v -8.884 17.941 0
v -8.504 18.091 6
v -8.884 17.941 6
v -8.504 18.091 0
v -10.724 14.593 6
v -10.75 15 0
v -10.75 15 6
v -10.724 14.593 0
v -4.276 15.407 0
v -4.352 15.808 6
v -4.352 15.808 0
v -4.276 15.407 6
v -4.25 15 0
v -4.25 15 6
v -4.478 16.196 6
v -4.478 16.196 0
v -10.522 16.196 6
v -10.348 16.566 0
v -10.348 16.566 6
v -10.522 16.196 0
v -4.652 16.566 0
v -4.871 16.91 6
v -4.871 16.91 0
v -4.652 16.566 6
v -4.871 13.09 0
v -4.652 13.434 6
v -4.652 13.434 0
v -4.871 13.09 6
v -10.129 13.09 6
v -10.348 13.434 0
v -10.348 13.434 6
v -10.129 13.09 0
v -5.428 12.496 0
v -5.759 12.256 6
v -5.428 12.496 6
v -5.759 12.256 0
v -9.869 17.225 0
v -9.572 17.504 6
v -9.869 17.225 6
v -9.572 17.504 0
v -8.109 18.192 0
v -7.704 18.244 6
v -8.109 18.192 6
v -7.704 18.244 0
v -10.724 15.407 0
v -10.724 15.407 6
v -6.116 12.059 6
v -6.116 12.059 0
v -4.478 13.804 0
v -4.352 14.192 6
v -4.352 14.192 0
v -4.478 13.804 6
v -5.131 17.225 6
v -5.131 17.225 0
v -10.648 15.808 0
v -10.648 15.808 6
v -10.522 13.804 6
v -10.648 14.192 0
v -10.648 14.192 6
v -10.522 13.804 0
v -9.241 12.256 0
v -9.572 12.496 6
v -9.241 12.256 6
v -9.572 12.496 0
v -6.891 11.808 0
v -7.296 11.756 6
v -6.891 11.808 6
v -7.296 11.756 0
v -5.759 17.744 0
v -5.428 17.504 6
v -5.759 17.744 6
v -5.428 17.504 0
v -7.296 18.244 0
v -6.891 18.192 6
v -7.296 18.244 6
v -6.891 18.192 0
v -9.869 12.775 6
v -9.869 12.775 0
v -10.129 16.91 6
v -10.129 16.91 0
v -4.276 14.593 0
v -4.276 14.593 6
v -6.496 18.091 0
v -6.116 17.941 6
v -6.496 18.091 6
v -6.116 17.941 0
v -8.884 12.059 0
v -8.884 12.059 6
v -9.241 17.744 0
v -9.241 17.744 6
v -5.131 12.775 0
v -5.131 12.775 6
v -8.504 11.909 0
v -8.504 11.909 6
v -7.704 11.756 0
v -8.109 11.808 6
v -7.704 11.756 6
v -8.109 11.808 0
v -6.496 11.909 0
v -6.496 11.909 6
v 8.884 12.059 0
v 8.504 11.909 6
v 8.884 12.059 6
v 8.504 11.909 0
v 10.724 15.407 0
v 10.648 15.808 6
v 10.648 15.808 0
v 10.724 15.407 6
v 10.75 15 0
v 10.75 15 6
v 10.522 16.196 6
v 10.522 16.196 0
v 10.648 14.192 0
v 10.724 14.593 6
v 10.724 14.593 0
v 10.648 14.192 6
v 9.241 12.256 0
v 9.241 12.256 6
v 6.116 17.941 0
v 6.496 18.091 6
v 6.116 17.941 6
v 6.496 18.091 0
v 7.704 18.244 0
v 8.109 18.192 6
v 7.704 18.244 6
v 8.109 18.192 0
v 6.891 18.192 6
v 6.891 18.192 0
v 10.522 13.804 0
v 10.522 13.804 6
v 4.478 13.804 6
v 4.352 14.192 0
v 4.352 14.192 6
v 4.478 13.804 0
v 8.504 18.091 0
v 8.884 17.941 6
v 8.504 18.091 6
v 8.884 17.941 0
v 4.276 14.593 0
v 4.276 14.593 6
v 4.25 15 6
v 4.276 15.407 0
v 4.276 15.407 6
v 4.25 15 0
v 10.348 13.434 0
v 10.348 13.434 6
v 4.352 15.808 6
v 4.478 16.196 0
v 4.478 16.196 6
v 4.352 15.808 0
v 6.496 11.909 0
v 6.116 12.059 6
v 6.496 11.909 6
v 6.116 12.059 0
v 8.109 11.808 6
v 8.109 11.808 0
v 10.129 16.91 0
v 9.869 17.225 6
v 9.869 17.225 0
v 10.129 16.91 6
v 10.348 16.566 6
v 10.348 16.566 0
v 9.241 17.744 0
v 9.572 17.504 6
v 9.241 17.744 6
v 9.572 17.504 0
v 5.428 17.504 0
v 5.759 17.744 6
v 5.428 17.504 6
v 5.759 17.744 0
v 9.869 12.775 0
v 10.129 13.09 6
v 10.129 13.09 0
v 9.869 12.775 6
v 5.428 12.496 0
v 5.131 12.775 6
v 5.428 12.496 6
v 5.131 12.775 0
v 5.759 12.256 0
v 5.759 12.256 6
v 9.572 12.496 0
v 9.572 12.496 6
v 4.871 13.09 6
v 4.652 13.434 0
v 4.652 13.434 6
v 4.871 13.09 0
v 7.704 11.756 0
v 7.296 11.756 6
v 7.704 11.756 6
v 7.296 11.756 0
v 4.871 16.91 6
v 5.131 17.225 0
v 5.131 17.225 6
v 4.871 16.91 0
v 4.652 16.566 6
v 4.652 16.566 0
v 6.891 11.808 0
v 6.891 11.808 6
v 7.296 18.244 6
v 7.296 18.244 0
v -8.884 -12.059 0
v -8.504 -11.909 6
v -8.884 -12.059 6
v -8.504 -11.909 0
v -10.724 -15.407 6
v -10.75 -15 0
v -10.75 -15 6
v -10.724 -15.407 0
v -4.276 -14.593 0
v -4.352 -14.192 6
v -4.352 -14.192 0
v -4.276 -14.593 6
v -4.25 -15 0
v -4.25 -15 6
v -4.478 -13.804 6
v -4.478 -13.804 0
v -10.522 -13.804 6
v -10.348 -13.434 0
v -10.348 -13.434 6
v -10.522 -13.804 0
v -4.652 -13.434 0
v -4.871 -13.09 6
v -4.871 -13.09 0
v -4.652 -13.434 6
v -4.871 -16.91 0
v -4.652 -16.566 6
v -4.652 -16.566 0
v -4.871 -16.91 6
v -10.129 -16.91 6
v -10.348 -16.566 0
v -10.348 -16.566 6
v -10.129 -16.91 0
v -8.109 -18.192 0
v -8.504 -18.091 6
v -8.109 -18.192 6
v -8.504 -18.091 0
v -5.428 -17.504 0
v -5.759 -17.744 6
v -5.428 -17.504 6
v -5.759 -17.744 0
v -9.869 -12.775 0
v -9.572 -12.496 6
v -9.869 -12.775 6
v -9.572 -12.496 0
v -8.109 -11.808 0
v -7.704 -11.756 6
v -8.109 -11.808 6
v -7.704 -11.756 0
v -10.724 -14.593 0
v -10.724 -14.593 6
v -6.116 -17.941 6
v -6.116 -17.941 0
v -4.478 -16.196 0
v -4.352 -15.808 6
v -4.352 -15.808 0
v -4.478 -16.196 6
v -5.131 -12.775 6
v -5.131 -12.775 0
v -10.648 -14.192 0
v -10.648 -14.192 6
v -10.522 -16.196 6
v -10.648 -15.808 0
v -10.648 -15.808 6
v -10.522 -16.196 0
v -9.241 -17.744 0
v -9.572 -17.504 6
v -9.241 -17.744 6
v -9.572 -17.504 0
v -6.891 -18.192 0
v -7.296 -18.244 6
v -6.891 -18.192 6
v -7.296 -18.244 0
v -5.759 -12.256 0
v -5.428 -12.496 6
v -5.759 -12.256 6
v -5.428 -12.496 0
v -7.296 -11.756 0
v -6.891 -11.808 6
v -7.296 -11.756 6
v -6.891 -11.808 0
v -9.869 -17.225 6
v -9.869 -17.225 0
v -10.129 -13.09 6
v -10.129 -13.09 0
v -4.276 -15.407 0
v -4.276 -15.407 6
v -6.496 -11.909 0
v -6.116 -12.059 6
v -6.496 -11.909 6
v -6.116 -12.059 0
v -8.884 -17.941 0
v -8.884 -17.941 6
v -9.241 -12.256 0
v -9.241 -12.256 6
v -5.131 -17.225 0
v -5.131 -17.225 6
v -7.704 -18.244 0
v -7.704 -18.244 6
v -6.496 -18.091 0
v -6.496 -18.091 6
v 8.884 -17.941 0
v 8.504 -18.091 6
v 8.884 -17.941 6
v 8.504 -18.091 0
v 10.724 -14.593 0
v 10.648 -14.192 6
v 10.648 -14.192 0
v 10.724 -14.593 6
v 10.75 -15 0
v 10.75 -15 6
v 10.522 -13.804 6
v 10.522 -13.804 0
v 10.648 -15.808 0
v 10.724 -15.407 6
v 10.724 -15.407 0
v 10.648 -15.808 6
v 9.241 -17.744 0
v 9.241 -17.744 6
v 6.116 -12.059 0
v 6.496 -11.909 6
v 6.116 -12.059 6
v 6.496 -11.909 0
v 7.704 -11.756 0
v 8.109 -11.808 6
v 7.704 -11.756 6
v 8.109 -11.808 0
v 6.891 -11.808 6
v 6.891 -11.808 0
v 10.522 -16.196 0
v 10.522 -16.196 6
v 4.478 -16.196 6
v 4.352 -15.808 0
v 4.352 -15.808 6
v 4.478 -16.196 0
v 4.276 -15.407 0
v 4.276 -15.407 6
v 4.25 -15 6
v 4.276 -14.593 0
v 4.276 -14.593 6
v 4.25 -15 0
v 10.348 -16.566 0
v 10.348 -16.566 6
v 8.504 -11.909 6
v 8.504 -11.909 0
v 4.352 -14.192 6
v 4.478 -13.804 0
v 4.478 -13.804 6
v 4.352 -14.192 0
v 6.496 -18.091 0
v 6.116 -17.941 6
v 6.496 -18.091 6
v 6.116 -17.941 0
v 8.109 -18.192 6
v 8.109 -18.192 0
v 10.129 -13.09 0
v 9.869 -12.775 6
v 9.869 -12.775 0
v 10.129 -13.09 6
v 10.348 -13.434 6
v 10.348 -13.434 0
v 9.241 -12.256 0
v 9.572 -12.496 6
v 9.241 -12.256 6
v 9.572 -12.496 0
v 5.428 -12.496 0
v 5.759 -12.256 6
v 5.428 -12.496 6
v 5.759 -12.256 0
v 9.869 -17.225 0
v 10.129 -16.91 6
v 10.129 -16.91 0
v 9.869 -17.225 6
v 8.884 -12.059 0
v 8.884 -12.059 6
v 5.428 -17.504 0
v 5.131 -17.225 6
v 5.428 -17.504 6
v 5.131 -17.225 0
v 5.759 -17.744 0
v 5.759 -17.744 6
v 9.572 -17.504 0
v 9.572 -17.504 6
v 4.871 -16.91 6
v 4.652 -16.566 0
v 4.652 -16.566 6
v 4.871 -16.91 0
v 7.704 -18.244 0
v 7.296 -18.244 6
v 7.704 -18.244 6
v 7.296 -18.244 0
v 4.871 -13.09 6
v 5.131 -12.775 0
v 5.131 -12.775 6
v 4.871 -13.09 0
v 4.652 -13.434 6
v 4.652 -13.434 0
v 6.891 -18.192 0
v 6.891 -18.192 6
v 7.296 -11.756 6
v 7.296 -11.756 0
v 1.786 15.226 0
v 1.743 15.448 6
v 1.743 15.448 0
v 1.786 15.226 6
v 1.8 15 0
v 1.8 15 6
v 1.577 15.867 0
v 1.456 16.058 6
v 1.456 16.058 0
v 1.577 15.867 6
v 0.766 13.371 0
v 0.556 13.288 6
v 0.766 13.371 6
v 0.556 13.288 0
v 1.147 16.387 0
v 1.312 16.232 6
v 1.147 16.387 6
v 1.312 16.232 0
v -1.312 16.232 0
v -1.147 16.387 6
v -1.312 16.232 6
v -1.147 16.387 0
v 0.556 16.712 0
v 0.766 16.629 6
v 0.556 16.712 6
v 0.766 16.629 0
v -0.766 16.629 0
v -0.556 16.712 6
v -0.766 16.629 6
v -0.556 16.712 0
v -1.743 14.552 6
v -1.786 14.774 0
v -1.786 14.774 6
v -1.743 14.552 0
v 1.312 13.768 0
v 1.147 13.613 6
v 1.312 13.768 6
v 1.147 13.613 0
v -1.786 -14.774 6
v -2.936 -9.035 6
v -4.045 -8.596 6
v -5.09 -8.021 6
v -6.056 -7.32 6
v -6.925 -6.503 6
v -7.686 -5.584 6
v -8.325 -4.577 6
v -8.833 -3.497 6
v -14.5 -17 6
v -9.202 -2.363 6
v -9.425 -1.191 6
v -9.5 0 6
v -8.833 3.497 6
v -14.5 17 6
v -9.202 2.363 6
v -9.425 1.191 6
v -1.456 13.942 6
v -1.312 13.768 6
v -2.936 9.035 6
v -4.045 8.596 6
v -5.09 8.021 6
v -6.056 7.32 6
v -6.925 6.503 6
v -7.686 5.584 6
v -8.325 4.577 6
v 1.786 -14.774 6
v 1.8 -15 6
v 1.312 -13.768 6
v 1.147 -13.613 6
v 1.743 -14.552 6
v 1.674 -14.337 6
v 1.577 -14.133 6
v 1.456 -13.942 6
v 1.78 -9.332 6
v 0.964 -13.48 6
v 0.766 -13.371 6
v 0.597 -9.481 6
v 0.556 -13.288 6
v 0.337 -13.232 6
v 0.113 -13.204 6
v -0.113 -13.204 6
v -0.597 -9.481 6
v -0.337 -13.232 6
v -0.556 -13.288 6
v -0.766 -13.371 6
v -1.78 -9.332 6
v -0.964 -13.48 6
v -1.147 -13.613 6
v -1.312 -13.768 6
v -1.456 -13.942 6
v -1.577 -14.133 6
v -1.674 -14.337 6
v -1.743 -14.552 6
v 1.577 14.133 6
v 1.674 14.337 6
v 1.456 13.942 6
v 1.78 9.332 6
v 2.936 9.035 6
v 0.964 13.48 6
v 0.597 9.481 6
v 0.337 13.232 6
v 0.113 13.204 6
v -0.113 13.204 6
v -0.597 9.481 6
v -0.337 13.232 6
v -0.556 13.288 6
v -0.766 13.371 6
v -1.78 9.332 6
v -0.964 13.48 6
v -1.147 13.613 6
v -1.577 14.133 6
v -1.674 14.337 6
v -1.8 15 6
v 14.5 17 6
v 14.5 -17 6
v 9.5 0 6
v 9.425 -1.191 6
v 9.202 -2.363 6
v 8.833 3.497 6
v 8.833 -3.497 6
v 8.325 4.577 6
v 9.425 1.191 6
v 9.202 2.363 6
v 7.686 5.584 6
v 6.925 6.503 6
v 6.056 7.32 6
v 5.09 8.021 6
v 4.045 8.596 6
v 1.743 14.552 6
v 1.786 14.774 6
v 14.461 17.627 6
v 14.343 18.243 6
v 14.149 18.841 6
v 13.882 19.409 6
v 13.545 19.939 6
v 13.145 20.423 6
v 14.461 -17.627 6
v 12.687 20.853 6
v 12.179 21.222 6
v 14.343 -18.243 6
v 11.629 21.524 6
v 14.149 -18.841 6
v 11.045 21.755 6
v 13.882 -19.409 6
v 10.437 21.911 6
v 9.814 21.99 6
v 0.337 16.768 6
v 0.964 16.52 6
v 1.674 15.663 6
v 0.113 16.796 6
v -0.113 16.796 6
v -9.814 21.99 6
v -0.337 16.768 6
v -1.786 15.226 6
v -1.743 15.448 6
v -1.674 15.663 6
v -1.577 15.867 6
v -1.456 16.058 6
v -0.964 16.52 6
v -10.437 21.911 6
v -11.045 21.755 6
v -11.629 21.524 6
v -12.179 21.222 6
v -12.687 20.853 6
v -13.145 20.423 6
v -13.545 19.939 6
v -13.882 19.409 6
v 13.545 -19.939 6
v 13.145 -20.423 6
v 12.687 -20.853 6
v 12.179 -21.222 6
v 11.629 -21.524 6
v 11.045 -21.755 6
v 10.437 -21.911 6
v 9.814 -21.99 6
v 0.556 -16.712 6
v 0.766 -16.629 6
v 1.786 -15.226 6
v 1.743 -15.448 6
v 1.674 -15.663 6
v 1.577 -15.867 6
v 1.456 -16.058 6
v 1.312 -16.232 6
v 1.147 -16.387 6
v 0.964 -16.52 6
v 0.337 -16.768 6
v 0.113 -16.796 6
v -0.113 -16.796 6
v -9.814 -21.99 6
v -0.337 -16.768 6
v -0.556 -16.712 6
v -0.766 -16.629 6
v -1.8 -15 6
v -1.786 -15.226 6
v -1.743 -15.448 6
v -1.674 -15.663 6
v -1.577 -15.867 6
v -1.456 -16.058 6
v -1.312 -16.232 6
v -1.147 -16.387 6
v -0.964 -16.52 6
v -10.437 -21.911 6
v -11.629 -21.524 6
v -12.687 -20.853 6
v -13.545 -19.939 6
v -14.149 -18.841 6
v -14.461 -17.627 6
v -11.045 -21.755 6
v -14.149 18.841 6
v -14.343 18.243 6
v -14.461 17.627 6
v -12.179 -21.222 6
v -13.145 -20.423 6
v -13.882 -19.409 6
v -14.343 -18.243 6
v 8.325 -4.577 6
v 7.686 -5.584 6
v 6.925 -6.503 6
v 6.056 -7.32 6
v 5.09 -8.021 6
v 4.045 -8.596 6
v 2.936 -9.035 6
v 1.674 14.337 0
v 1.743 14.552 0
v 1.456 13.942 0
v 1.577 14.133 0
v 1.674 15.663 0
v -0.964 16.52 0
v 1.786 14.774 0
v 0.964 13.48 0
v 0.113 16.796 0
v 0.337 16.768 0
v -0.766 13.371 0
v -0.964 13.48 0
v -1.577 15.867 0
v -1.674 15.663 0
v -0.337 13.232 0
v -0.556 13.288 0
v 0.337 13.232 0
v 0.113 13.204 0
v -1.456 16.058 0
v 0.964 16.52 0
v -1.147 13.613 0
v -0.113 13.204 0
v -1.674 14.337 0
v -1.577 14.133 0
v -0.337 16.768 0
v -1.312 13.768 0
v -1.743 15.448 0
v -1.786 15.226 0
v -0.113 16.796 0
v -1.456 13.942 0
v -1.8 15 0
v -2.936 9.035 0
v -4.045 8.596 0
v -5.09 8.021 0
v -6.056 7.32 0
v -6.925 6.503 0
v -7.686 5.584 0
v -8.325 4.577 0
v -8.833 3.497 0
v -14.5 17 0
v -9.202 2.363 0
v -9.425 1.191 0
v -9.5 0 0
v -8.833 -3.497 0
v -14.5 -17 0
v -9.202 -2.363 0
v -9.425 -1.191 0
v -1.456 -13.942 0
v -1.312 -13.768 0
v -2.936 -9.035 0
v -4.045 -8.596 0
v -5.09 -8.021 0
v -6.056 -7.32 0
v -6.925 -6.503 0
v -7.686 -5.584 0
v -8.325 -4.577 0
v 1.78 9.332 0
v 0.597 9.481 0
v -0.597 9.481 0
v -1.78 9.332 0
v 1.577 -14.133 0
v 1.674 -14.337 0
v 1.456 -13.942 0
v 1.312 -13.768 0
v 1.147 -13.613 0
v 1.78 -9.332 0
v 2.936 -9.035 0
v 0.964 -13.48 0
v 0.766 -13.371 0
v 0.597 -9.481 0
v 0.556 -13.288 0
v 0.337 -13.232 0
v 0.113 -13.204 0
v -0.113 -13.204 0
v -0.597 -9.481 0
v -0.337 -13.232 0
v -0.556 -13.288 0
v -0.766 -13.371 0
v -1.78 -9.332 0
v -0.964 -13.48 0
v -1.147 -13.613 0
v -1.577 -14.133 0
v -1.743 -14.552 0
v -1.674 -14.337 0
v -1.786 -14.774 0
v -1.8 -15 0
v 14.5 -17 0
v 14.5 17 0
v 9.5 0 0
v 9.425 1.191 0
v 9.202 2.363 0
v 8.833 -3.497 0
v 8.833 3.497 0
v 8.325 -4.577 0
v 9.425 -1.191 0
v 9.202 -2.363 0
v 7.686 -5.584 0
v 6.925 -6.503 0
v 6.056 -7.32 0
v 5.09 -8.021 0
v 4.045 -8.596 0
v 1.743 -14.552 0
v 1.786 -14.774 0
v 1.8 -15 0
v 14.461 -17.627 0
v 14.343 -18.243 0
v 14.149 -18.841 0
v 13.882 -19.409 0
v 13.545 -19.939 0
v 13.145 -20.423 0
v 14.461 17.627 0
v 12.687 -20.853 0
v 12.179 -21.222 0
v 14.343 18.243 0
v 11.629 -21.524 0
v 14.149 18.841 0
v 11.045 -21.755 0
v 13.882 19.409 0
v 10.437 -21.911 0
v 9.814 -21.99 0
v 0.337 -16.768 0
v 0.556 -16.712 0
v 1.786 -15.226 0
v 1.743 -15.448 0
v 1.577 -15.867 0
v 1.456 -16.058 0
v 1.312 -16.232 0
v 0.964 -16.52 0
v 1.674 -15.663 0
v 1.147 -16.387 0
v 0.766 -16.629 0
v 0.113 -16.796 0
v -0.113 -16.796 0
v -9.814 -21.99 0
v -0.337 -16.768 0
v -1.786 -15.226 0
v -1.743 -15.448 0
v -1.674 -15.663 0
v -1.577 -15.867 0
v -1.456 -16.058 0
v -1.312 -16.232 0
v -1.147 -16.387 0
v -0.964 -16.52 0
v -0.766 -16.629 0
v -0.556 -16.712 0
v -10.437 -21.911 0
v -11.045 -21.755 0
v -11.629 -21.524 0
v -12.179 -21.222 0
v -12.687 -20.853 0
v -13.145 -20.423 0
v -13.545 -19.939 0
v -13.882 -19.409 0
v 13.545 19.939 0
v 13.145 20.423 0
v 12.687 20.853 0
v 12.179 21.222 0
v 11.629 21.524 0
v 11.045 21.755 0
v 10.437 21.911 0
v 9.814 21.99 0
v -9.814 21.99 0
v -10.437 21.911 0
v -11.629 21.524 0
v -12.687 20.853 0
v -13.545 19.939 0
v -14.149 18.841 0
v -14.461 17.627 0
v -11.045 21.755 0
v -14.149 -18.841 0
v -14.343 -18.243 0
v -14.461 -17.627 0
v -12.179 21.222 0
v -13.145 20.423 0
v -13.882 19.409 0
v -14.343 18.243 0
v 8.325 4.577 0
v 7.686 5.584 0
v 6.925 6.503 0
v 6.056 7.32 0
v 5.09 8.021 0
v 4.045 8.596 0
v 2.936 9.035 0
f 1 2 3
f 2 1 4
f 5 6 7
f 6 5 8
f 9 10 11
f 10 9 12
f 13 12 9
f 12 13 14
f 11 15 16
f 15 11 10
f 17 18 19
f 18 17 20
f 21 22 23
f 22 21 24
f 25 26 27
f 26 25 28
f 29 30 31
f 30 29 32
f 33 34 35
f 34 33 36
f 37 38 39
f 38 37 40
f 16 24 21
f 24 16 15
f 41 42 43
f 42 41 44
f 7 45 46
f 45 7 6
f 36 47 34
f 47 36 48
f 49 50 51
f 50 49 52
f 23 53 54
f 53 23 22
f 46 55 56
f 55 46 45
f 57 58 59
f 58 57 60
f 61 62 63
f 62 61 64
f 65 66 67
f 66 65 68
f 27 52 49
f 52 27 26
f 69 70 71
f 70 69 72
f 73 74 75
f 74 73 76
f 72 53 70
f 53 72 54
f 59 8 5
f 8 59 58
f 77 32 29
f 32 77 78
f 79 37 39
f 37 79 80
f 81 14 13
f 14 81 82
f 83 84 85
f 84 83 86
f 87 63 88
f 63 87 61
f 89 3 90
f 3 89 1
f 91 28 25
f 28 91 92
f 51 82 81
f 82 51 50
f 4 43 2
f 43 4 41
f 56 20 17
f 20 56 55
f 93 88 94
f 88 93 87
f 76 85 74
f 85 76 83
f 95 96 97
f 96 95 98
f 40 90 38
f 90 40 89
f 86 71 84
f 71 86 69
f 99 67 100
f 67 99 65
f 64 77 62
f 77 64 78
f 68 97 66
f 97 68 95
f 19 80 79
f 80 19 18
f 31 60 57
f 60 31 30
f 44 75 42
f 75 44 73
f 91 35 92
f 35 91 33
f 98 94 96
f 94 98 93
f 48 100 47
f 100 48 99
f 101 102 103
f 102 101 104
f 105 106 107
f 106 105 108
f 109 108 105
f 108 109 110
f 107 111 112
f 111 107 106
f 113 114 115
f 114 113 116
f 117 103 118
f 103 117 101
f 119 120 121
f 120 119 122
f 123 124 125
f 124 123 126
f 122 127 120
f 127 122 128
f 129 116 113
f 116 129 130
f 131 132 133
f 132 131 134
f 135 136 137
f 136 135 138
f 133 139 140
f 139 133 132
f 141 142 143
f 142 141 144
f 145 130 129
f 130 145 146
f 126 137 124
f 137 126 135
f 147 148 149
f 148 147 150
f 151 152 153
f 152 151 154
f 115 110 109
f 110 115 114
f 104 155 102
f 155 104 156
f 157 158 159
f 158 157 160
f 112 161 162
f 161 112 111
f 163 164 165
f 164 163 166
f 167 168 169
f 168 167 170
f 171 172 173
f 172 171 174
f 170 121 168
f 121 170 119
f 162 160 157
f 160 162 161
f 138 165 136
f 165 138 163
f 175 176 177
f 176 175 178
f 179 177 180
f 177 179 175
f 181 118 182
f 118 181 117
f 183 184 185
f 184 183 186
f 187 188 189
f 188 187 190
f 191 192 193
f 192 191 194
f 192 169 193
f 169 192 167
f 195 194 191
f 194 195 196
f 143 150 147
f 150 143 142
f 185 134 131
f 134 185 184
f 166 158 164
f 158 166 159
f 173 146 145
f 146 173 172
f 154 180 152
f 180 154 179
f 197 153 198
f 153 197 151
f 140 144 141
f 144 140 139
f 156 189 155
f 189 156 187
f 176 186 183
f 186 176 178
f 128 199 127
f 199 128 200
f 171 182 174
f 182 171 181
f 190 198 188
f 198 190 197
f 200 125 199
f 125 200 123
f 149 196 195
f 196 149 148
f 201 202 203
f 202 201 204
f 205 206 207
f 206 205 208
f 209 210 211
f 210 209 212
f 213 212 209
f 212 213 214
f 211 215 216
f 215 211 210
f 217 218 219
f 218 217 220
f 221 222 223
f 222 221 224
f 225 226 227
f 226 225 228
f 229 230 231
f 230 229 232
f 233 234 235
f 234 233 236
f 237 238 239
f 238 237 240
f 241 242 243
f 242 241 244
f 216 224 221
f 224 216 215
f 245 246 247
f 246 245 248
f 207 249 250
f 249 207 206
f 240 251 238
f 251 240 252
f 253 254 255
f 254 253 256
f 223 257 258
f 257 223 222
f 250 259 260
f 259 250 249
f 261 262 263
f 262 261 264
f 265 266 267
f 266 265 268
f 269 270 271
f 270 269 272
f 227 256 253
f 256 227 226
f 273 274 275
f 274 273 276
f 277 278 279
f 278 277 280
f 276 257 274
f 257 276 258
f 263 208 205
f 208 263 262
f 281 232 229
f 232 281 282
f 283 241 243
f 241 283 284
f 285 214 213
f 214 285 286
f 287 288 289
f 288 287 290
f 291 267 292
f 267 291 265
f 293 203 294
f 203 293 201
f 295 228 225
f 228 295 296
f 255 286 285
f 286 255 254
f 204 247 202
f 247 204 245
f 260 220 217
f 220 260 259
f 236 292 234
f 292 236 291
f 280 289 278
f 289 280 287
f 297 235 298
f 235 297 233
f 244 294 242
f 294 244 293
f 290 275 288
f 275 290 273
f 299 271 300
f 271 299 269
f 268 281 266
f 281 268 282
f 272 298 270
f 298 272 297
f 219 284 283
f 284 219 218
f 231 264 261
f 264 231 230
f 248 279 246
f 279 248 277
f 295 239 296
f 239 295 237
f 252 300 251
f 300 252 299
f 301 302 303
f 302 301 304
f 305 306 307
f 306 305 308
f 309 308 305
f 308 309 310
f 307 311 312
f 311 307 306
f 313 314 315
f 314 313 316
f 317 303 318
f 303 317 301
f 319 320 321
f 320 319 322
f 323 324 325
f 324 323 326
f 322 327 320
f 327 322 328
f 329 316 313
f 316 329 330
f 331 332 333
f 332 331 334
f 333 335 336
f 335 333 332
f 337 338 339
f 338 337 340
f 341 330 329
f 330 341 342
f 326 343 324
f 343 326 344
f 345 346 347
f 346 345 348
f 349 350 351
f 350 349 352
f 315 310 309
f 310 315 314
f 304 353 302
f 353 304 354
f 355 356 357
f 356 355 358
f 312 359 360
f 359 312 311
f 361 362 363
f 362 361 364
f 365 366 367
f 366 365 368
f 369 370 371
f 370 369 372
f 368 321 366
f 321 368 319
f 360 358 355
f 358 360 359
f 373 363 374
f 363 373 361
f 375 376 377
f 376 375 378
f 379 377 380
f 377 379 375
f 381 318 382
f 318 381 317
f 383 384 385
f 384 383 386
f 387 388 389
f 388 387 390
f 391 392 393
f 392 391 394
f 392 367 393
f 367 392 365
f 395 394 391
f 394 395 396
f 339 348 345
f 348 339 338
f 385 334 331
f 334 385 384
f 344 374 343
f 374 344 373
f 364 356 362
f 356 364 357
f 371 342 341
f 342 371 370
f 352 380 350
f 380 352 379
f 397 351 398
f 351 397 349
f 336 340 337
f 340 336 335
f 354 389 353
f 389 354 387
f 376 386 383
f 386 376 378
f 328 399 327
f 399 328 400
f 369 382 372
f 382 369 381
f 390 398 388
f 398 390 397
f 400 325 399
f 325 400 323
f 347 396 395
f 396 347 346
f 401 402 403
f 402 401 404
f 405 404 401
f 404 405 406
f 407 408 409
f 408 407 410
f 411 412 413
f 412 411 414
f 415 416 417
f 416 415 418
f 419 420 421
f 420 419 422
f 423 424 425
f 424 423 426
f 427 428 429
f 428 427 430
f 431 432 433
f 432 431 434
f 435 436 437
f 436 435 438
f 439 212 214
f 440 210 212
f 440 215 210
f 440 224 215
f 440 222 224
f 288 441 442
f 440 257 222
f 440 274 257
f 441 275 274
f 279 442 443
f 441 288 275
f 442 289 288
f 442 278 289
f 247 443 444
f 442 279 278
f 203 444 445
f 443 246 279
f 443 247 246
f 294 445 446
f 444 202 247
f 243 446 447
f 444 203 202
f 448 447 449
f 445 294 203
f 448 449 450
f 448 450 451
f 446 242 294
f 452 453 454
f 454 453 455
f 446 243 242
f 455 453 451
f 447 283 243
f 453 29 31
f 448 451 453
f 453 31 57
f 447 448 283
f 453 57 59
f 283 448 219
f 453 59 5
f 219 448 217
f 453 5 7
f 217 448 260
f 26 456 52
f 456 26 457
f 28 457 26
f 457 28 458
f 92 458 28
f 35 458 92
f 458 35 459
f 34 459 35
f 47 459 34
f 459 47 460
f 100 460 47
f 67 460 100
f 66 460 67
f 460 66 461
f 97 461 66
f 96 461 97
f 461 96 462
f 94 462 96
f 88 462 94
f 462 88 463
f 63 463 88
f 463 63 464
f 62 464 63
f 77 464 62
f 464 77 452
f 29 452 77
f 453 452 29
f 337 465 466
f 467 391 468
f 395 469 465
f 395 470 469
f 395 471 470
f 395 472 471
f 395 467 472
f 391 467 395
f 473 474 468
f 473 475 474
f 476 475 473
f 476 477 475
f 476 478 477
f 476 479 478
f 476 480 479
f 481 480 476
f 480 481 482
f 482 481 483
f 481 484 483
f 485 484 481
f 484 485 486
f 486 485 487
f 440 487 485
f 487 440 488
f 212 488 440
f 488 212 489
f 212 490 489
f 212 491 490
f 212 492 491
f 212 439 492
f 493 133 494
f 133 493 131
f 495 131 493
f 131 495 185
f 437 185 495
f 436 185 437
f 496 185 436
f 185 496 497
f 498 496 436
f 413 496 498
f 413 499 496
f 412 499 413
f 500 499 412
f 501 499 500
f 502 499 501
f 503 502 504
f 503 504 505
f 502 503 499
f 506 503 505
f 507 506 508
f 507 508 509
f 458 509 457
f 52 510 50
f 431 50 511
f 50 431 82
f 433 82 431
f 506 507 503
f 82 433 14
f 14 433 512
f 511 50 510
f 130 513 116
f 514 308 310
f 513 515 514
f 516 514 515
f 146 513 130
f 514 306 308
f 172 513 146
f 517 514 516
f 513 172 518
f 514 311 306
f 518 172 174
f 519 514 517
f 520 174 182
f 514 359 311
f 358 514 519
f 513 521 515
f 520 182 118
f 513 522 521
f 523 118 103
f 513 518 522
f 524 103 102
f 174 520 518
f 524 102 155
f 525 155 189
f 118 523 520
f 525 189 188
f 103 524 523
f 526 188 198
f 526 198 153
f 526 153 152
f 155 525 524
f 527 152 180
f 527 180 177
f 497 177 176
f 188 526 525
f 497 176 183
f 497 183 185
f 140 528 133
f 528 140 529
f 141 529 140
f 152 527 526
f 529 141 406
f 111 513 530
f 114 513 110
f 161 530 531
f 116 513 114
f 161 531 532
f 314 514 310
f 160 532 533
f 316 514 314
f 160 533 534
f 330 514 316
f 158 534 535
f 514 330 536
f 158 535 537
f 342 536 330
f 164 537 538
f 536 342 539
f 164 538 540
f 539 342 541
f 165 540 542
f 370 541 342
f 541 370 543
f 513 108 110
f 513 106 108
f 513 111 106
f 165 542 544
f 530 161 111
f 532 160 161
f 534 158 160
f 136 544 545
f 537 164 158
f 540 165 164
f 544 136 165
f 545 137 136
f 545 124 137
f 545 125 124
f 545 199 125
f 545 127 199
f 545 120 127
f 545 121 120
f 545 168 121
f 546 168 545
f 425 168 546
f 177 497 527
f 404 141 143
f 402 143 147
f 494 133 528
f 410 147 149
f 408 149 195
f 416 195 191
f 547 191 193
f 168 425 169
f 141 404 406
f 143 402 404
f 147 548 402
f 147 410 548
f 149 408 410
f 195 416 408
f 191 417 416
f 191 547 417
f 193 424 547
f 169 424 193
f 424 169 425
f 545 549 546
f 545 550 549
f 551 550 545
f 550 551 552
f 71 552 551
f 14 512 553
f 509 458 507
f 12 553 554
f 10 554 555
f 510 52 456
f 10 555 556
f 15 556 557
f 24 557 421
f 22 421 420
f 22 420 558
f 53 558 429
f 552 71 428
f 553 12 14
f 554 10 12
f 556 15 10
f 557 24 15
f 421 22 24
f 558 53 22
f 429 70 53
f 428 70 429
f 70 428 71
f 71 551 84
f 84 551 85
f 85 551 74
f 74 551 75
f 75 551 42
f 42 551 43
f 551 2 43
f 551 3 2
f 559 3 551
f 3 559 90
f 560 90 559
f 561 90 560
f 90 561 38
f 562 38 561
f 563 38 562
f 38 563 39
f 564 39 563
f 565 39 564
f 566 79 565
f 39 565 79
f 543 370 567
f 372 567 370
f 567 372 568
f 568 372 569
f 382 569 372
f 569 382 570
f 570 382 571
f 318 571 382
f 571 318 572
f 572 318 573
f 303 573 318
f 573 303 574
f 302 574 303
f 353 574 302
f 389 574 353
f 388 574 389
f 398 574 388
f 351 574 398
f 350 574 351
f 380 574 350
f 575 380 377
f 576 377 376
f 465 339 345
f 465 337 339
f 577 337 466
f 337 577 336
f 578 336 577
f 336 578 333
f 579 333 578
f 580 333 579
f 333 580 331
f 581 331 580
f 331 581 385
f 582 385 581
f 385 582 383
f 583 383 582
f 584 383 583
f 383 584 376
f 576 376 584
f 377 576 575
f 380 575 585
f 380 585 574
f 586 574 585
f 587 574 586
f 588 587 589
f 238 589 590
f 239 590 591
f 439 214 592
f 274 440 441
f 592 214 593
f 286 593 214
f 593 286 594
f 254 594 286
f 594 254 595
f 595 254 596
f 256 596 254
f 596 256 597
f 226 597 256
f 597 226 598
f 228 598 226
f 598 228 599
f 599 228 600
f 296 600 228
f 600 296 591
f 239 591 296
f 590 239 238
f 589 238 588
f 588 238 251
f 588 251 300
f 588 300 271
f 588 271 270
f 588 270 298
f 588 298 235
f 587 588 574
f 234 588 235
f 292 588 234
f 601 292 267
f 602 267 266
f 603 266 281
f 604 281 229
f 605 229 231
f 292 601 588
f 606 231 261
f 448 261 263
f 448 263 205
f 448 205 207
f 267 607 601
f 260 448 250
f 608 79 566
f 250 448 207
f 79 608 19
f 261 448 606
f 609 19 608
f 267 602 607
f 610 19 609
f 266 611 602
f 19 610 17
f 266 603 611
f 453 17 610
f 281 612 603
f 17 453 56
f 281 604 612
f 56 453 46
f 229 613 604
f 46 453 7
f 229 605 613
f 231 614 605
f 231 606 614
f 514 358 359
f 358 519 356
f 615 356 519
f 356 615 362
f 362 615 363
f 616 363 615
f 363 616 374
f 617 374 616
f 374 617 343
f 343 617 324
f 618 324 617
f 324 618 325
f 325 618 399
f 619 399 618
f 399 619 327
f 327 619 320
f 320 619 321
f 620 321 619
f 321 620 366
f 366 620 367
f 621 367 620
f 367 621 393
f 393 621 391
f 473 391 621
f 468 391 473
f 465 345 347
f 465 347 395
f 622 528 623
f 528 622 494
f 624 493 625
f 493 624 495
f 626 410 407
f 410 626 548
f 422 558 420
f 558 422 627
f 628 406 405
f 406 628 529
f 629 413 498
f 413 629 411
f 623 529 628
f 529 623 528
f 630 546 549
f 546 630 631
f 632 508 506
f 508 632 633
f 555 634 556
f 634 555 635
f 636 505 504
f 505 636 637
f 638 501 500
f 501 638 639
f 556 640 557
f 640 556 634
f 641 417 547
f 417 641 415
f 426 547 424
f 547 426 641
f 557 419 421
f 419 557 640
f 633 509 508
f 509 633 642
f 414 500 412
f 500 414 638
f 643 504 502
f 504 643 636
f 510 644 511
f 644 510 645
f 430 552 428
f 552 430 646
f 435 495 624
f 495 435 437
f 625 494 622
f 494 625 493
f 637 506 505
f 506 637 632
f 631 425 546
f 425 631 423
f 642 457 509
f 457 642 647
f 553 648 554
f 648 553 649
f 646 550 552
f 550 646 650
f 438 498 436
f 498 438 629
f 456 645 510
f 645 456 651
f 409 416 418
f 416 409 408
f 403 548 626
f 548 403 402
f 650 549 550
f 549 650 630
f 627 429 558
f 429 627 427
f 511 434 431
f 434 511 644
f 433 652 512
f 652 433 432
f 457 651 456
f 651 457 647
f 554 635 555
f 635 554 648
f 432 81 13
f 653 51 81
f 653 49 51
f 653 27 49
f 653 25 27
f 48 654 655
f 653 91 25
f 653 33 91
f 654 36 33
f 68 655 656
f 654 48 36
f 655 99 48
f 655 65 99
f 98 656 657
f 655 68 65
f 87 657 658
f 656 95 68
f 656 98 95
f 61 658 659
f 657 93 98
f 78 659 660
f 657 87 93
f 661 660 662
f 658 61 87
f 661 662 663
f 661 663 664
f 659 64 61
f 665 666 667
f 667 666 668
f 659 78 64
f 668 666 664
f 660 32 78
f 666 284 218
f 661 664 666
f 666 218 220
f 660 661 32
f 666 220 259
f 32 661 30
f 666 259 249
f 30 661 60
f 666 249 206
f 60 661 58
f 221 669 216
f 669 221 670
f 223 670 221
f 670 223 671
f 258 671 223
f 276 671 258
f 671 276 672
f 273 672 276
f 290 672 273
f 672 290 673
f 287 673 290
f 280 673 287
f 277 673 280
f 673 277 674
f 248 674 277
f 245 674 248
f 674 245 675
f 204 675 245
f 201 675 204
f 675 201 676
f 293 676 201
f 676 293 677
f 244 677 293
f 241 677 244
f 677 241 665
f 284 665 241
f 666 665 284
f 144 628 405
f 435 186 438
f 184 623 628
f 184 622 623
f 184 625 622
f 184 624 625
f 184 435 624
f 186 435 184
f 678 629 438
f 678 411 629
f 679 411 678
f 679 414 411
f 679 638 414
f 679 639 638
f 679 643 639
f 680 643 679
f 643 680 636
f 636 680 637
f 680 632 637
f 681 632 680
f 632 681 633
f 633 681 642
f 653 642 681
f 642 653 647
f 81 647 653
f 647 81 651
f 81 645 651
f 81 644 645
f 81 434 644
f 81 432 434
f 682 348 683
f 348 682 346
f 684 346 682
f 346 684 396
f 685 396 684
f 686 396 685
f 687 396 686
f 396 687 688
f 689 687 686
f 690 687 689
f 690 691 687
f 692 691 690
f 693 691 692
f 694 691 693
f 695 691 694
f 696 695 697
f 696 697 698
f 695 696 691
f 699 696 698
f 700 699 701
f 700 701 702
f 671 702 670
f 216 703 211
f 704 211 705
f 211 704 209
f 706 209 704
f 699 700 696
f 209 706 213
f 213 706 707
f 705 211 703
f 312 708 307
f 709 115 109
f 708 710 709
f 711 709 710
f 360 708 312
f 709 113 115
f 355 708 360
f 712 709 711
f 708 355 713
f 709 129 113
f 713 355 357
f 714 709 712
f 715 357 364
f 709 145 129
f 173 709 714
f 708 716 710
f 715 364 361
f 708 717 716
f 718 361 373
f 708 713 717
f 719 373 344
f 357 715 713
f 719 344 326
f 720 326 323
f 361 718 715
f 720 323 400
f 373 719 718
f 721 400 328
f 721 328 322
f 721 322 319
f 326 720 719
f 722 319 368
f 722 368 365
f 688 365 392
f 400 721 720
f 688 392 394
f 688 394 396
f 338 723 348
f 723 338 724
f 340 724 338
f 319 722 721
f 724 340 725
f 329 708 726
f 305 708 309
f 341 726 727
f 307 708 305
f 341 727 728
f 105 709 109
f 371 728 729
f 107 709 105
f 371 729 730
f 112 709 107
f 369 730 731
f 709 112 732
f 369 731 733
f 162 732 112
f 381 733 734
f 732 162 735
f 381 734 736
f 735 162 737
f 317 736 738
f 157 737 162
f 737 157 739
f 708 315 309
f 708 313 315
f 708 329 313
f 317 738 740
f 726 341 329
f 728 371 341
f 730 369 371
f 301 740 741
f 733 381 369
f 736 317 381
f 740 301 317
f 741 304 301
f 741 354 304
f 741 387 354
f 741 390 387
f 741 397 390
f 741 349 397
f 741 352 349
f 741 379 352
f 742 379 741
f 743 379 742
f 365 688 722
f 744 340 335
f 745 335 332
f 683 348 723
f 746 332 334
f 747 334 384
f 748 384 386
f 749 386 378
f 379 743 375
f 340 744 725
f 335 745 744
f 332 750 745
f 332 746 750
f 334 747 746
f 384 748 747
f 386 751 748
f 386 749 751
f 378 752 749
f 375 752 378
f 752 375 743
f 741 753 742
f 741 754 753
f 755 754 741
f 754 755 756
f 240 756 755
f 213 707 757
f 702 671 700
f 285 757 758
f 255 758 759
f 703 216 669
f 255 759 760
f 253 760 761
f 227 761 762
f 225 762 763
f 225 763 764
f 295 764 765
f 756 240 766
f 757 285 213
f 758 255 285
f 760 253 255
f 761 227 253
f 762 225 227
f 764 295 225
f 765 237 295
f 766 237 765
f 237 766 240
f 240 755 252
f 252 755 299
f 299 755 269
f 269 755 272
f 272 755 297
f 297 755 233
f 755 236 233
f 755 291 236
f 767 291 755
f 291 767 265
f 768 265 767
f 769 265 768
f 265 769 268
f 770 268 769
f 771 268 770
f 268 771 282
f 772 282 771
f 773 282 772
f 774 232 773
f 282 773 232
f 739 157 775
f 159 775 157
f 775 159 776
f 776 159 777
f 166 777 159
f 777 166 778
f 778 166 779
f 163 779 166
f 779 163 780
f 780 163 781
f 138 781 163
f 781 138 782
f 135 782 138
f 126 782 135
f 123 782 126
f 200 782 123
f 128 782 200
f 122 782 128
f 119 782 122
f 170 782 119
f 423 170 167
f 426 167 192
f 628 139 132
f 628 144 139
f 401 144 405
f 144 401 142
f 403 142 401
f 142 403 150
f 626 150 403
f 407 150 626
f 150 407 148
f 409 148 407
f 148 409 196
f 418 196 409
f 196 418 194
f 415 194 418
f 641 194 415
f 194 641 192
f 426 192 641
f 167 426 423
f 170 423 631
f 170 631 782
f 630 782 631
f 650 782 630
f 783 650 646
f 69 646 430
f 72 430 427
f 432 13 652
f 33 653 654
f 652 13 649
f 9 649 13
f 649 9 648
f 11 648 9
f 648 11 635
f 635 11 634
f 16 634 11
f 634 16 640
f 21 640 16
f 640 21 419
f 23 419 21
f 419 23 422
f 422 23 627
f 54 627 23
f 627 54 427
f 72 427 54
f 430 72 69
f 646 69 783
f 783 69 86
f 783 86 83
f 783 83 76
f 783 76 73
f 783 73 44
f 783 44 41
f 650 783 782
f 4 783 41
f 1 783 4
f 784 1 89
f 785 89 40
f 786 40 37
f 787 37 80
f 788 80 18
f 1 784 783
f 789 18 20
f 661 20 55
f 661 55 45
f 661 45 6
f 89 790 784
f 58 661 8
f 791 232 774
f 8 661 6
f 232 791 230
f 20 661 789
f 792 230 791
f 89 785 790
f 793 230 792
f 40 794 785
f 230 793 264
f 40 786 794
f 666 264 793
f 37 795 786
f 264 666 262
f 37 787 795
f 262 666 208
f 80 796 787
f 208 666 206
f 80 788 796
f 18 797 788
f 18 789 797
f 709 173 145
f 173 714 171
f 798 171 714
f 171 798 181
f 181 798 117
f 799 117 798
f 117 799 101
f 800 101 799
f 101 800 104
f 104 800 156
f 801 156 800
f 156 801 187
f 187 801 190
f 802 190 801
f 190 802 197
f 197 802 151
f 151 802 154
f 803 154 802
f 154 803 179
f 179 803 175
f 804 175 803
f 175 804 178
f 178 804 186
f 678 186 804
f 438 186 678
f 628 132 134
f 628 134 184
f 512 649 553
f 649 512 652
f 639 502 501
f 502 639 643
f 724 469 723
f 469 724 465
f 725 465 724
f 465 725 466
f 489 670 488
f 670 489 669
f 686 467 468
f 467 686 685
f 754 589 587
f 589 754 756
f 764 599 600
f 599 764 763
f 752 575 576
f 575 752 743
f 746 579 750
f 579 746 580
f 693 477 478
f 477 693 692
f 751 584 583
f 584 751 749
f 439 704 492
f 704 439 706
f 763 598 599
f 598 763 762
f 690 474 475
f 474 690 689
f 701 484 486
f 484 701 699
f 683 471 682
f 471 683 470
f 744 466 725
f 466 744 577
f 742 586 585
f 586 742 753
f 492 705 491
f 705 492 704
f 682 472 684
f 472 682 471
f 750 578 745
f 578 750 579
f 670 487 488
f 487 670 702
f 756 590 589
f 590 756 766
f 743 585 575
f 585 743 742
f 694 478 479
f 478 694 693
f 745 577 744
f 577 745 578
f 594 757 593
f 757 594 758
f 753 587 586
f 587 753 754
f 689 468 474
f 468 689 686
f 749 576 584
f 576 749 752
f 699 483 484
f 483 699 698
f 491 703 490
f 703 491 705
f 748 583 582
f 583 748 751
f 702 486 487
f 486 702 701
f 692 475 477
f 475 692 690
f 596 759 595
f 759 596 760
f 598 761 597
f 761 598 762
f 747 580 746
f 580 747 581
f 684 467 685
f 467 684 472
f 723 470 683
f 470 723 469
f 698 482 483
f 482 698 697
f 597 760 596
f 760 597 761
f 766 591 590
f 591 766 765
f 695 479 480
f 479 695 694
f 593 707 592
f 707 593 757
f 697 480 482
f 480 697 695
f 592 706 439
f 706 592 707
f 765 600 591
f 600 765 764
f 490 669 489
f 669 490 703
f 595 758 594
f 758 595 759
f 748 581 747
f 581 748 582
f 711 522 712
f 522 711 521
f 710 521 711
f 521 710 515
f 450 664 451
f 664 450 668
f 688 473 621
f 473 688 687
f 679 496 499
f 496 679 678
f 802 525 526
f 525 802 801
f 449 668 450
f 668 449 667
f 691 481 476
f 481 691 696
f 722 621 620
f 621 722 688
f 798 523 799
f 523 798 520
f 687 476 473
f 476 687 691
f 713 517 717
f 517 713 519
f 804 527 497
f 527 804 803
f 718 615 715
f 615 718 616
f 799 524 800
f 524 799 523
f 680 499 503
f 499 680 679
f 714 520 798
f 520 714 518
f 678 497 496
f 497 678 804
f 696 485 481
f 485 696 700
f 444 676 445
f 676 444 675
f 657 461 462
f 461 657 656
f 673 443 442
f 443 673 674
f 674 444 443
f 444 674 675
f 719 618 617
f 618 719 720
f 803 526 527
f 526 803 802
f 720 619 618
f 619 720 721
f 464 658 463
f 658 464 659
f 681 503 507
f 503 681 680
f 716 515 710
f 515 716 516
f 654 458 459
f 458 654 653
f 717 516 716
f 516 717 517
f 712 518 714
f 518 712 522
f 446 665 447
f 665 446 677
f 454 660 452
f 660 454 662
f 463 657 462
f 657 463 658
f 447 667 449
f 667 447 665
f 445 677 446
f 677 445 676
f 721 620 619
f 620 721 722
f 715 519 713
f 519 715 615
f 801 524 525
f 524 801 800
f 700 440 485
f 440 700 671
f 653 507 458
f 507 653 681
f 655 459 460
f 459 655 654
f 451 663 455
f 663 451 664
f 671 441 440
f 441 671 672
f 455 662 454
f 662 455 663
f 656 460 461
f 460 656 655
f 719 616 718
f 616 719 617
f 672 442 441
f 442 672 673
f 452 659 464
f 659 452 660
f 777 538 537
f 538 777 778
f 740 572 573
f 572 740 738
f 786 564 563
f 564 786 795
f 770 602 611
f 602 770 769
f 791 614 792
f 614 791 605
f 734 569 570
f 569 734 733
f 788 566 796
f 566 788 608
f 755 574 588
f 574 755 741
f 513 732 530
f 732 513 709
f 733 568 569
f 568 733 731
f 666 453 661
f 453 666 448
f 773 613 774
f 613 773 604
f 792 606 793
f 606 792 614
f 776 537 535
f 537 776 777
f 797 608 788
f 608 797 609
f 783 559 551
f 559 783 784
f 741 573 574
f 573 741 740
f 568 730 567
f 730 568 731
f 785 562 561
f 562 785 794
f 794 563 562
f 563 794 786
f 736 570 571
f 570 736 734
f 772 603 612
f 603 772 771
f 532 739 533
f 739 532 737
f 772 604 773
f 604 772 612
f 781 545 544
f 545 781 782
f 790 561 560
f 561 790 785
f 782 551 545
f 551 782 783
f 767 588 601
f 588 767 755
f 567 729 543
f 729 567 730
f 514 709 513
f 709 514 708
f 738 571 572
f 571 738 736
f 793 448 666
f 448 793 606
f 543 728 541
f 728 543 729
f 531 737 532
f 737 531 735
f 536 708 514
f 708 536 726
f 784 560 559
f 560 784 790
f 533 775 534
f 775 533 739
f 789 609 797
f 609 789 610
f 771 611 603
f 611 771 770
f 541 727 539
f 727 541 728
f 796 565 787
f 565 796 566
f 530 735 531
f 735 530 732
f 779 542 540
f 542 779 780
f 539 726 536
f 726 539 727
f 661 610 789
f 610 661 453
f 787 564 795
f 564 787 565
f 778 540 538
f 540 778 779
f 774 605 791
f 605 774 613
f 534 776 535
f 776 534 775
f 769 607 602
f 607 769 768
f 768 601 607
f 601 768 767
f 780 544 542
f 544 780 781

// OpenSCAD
$fn = 50;


difference() {
	union() {
		hull() {
			translate(v = [-9.5000000000, 17.0000000000, 0]) {
				cylinder(h = 6, r = 5);
			}
			translate(v = [9.5000000000, 17.0000000000, 0]) {
				cylinder(h = 6, r = 5);
			}
			translate(v = [-9.5000000000, -17.0000000000, 0]) {
				cylinder(h = 6, r = 5);
			}
			translate(v = [9.5000000000, -17.0000000000, 0]) {
				cylinder(h = 6, r = 5);
			}
		}
	}
	union() {
		#translate(v = [-7.5000000000, 15.0000000000, 0]) {
			cylinder(h = 6, r = 3.2500000000);
		}
		#translate(v = [7.5000000000, 15.0000000000, 0]) {
			cylinder(h = 6, r = 3.2500000000);
		}
		#translate(v = [-7.5000000000, -15.0000000000, 0]) {
			cylinder(h = 6, r = 3.2500000000);
		}
		#translate(v = [7.5000000000, -15.0000000000, 0]) {
			cylinder(h = 6, r = 3.2500000000);
		}
		#translate(v = [-7.5000000000, -15.0000000000, -100.0000000000]) {
			cylinder(h = 200, r = 3.2500000000);
		}
		#translate(v = [-7.5000000000, 15.0000000000, -100.0000000000]) {
			cylinder(h = 200, r = 3.2500000000);
		}
		#translate(v = [7.5000000000, -15.0000000000, -100.0000000000]) {
			cylinder(h = 200, r = 3.2500000000);
		}
		#translate(v = [7.5000000000, 15.0000000000, -100.0000000000]) {
			cylinder(h = 200, r = 3.2500000000);
		}
		#translate(v = [-7.5000000000, 15.0000000000, 0]) {
			cylinder(h = 6, r = 1.8000000000);
		}
		#translate(v = [0.0000000000, 15.0000000000, 0]) {
			cylinder(h = 6, r = 1.8000000000);
		}
		#translate(v = [7.5000000000, 15.0000000000, 0]) {
			cylinder(h = 6, r = 1.8000000000);
		}
		#translate(v = [-7.5000000000, -15.0000000000, 0]) {
			cylinder(h = 6, r = 1.8000000000);
		}
		#translate(v = [0.0000000000, -15.0000000000, 0]) {
			cylinder(h = 6, r = 1.8000000000);
		}
		#translate(v = [7.5000000000, -15.0000000000, 0]) {
			cylinder(h = 6, r = 1.8000000000);
		}
		#translate(v = [-7.5000000000, 15.0000000000, 0]) {
			cylinder(h = 6, r = 1.8000000000);
		}
		#translate(v = [0.0000000000, 15.0000000000, 0]) {
			cylinder(h = 6, r = 1.8000000000);
		}
		#translate(v = [7.5000000000, 15.0000000000, 0]) {
			cylinder(h = 6, r = 1.8000000000);
		}
		#translate(v = [-7.5000000000, -15.0000000000, 0]) {
			cylinder(h = 6, r = 1.8000000000);
		}
		#translate(v = [0.0000000000, -15.0000000000, 0]) {
			cylinder(h = 6, r = 1.8000000000);
		}
		#translate(v = [7.5000000000, -15.0000000000, 0]) {
			cylinder(h = 6, r = 1.8000000000);
		}
		#translate(v = [-7.5000000000, 15.0000000000, 0]) {
			cylinder(h = 6, r = 1.8000000000);
		}
		#translate(v = [0.0000000000, 15.0000000000, 0]) {
			cylinder(h = 6, r = 1.8000000000);
		}
		#translate(v = [7.5000000000, 15.0000000000, 0]) {
			cylinder(h = 6, r = 1.8000000000);
		}
		#translate(v = [-7.5000000000, -15.0000000000, 0]) {
			cylinder(h = 6, r = 1.8000000000);
		}
		#translate(v = [0.0000000000, -15.0000000000, 0]) {
			cylinder(h = 6, r = 1.8000000000);
		}
		#translate(v = [7.5000000000, -15.0000000000, 0]) {
			cylinder(h = 6, r = 1.8000000000);
		}
		#cylinder(h = 6, r = 9.5000000000);
	}
}
